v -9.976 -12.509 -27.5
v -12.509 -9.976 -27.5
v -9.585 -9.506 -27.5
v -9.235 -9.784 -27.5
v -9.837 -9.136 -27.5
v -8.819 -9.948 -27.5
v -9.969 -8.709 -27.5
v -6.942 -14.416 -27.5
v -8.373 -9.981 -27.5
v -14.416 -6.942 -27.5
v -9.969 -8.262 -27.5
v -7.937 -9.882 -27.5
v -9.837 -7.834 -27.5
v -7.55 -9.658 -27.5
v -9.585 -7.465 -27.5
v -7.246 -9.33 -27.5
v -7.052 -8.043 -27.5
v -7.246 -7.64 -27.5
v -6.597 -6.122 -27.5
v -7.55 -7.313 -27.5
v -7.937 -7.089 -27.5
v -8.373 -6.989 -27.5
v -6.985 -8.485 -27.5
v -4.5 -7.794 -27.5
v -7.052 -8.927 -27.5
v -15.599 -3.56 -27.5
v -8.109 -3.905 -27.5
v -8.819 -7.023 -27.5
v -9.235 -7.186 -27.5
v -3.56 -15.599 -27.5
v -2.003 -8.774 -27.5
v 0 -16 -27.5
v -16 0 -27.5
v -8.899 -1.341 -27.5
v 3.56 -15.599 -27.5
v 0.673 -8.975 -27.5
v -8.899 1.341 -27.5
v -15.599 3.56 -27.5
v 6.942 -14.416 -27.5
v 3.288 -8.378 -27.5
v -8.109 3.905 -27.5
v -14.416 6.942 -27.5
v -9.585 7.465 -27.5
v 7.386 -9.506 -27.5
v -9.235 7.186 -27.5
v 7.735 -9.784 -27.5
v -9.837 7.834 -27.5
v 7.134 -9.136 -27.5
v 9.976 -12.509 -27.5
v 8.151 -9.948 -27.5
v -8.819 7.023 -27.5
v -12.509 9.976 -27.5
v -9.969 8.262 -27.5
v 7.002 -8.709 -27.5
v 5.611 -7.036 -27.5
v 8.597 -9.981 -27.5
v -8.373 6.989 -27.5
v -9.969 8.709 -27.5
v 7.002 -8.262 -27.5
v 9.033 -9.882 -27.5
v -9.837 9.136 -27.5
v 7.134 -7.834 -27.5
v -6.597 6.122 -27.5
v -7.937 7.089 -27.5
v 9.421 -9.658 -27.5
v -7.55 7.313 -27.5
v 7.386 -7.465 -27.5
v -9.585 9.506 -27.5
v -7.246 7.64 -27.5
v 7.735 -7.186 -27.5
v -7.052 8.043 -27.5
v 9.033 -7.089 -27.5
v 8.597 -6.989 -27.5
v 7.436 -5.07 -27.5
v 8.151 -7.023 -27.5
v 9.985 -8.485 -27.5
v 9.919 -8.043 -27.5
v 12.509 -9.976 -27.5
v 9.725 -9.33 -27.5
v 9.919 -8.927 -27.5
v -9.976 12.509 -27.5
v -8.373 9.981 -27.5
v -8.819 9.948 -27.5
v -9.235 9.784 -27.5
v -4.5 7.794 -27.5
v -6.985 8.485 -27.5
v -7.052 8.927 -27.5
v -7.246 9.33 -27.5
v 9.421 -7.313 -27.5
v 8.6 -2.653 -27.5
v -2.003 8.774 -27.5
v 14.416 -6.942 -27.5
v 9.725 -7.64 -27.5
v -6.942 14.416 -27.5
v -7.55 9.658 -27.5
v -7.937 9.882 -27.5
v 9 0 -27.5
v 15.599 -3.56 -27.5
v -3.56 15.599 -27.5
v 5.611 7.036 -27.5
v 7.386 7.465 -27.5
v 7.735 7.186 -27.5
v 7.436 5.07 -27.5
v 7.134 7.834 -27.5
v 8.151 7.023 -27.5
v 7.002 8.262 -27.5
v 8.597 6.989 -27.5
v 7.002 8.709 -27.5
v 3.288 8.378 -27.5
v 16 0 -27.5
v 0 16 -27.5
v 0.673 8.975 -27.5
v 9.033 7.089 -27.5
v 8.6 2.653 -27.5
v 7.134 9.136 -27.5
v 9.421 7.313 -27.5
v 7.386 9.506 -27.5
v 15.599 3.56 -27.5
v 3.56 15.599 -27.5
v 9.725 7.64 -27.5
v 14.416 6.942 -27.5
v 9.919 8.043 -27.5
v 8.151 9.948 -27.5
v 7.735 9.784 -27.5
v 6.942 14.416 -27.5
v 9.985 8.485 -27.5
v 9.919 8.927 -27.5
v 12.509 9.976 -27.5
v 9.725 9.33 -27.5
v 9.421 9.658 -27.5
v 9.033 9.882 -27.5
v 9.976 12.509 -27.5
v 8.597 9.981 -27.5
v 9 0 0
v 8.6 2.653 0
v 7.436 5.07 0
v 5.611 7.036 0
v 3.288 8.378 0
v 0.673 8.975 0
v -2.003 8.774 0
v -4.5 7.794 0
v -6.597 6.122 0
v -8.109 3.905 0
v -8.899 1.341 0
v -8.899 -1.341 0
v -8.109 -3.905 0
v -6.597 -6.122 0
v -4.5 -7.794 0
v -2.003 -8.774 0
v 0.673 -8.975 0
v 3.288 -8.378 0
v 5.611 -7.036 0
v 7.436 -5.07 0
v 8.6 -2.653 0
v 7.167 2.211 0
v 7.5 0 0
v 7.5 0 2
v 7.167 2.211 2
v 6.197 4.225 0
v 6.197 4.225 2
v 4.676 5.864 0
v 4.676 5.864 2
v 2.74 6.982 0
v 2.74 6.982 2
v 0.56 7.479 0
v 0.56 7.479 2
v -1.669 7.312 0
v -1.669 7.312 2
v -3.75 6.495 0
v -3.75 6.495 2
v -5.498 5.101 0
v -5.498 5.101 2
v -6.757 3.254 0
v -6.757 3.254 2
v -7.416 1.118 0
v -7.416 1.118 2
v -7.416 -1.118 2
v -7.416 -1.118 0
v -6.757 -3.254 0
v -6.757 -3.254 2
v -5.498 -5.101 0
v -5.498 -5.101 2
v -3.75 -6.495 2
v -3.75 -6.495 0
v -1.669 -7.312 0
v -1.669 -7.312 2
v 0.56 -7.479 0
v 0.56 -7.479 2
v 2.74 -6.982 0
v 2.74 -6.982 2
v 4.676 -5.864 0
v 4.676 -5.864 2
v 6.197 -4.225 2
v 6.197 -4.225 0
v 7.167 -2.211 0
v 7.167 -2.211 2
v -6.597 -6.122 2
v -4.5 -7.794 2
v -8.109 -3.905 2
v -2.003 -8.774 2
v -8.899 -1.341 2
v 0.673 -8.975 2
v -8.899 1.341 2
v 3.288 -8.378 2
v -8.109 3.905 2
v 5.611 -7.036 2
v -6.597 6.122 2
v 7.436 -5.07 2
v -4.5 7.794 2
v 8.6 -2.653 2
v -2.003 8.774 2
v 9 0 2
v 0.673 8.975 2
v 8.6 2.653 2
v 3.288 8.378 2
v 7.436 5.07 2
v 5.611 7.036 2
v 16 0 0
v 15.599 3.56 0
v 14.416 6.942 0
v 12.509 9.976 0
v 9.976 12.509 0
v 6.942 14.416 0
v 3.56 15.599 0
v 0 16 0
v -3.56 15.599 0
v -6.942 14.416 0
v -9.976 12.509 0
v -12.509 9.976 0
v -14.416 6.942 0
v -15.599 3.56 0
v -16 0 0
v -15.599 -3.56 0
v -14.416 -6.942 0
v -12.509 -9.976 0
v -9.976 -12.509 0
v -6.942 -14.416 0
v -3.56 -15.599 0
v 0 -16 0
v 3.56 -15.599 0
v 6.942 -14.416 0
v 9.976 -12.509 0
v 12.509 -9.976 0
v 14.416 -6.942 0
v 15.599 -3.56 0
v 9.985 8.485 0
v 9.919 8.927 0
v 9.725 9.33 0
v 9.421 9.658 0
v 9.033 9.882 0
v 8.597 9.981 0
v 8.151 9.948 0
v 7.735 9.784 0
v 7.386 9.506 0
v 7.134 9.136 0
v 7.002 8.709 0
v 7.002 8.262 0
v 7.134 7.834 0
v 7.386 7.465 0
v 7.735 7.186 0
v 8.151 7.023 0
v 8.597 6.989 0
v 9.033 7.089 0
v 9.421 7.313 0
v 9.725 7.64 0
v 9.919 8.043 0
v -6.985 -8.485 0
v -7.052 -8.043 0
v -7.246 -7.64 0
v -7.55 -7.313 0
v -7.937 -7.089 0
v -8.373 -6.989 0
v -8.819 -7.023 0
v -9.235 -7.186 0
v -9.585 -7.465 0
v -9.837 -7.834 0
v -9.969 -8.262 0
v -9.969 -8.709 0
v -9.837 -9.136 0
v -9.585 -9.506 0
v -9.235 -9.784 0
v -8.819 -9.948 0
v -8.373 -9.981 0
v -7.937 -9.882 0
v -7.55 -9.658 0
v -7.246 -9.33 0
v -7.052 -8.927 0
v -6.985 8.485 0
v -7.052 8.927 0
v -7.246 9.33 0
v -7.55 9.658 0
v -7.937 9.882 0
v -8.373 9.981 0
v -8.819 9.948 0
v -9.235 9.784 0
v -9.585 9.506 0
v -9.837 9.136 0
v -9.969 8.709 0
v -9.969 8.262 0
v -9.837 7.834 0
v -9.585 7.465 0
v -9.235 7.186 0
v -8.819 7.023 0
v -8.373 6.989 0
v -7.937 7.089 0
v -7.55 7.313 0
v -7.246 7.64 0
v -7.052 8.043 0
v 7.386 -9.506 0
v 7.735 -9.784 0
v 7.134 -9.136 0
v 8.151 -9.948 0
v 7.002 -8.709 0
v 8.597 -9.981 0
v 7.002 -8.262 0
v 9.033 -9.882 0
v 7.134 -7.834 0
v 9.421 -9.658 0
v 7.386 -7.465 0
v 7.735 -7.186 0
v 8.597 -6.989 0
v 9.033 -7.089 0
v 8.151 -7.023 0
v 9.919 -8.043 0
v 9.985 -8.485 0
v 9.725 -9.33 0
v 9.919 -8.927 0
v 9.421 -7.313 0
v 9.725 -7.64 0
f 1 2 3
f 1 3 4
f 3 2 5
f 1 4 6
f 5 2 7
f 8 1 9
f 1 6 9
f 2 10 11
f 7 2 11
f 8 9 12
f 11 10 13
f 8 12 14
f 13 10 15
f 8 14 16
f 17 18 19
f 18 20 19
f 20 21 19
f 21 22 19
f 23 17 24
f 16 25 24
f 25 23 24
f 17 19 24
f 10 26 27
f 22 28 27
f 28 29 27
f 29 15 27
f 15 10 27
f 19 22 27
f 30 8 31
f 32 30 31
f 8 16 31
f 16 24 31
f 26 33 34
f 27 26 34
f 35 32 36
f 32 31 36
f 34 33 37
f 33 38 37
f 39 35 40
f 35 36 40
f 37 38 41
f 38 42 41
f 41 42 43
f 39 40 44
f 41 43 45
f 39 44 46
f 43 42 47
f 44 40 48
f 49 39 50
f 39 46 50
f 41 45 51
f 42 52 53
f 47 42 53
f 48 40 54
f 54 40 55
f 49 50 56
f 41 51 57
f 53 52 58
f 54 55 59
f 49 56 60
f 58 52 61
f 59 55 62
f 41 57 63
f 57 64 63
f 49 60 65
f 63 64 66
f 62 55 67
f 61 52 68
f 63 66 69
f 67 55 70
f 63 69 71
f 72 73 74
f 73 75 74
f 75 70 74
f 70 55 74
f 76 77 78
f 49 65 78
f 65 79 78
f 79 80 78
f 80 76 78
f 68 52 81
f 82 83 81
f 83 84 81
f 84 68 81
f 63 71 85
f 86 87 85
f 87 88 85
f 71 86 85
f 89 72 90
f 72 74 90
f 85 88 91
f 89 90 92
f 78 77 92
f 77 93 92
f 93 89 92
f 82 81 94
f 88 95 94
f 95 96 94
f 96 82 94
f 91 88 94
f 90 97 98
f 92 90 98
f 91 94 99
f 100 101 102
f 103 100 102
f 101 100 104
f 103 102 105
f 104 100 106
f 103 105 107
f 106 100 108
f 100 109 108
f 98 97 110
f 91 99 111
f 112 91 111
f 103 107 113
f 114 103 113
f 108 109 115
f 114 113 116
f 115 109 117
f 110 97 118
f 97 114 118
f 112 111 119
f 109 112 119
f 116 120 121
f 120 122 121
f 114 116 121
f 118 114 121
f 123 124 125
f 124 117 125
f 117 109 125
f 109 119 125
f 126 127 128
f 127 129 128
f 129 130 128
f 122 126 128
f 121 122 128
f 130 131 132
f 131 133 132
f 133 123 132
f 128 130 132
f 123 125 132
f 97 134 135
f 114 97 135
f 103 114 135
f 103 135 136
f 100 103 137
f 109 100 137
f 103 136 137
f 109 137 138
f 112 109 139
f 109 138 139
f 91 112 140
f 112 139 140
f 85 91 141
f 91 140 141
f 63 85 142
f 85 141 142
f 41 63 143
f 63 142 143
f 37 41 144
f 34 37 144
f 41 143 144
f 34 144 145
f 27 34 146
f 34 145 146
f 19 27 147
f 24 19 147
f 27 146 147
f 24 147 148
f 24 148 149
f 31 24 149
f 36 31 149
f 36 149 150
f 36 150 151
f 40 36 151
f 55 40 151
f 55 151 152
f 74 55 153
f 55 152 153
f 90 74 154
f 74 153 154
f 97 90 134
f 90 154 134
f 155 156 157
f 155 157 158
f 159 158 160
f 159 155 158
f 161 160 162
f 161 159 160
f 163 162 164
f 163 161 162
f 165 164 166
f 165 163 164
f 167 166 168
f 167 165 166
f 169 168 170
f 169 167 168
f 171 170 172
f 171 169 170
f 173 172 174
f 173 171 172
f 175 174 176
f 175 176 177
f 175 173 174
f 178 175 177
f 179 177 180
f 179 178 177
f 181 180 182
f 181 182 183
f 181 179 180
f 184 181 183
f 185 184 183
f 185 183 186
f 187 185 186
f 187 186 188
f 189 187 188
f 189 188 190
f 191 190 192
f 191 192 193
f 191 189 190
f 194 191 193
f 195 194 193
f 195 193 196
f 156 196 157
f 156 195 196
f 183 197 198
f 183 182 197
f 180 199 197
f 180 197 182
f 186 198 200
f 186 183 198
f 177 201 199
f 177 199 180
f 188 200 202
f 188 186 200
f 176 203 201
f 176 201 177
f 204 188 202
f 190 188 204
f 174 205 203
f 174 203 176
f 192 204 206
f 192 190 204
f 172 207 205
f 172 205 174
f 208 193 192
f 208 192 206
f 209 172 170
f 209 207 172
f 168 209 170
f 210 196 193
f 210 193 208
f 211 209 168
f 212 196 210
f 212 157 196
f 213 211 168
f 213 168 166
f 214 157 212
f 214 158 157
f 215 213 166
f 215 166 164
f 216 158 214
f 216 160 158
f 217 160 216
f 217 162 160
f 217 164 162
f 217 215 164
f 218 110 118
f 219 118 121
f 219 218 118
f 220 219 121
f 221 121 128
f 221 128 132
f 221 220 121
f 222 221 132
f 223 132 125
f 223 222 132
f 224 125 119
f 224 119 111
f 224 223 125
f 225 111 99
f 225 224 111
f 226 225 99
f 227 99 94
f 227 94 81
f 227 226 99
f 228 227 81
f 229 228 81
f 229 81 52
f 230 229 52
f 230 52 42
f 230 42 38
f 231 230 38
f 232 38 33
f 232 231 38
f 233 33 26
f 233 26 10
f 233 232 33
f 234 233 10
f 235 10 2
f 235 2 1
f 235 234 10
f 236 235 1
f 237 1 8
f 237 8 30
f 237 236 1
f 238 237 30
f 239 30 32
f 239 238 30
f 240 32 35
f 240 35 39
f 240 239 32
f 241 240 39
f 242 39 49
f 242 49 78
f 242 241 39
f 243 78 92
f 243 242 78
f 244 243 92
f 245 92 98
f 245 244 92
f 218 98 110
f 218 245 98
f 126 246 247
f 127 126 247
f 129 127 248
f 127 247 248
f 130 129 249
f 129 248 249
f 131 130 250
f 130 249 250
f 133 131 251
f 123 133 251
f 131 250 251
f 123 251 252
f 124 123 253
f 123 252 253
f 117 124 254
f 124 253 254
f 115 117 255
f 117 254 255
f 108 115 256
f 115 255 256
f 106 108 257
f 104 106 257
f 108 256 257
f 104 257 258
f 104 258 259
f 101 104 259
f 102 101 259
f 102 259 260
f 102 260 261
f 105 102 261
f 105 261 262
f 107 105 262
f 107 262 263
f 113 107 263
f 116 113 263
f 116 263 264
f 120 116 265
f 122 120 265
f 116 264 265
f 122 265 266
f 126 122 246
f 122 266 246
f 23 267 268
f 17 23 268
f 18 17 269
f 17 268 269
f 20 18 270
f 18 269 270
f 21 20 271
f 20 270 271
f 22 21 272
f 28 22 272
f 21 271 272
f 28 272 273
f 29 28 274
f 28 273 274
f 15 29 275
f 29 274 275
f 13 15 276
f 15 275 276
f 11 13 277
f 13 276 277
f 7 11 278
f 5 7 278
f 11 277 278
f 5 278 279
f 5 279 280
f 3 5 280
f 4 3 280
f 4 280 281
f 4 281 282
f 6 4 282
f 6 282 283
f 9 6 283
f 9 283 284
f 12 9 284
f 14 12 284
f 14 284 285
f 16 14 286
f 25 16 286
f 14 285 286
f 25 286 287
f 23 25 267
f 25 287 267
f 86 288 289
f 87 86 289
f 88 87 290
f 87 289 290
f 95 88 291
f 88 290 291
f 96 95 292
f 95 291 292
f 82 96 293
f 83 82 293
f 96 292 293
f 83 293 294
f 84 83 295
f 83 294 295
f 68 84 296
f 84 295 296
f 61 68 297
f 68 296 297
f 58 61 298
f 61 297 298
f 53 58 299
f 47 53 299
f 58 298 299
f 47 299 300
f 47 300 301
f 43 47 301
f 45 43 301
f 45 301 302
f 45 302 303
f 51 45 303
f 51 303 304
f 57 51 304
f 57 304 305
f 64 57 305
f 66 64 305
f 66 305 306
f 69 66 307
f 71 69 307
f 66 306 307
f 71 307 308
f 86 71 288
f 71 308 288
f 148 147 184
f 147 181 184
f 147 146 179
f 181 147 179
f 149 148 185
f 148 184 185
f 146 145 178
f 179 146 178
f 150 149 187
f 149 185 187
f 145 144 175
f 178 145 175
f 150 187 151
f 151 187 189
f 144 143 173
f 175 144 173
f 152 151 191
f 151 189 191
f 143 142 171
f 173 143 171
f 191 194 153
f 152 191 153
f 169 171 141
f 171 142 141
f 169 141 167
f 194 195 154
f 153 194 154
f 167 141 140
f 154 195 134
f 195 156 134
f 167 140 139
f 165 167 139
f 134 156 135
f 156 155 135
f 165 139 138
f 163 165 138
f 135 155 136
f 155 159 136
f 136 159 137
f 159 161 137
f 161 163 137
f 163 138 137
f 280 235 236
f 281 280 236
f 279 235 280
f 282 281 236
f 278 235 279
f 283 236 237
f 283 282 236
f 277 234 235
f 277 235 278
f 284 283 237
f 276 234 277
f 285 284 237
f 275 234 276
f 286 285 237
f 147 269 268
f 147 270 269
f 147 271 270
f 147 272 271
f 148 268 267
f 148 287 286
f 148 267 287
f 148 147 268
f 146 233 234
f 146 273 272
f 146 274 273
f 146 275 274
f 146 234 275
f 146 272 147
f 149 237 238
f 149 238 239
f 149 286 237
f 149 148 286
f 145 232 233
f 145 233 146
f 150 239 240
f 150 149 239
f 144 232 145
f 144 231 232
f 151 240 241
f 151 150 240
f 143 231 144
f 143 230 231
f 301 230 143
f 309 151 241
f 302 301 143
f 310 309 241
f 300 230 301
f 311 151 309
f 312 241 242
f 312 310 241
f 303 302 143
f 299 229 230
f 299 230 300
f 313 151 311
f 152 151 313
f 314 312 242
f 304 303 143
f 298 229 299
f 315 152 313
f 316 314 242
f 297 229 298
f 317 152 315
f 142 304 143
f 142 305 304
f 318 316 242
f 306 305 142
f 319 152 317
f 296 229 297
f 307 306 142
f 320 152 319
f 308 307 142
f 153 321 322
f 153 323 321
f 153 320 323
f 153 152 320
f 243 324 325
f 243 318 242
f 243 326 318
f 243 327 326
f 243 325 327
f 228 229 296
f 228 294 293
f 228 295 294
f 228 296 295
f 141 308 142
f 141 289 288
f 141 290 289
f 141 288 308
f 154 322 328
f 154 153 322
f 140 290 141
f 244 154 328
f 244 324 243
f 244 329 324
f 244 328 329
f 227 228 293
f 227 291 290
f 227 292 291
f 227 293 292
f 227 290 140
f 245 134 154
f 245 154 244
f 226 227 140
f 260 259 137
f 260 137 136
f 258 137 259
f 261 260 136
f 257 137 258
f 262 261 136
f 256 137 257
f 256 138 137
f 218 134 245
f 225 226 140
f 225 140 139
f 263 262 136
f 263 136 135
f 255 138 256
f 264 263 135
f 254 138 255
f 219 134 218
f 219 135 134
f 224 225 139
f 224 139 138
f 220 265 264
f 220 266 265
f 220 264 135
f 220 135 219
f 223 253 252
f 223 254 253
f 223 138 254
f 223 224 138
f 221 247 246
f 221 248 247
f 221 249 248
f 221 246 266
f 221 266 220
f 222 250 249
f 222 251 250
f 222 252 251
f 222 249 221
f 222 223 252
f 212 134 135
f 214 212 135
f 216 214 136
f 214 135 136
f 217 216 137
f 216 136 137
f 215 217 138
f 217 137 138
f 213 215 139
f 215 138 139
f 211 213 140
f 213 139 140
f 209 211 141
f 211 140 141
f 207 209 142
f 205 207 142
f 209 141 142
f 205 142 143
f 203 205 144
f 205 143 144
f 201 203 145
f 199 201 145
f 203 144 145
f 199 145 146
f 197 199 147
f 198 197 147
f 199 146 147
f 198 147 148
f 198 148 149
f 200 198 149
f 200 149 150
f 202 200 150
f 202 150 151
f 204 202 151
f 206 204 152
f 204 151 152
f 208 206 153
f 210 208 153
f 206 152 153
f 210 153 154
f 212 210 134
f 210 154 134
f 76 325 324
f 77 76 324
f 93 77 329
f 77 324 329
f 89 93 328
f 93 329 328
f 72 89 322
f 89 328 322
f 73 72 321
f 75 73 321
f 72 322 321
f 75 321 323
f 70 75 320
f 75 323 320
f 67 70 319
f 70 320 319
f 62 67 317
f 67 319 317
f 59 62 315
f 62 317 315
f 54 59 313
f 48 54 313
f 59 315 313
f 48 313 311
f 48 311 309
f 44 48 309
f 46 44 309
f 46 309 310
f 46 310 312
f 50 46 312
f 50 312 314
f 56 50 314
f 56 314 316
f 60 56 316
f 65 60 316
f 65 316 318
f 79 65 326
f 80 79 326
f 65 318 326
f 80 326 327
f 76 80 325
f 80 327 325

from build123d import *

# Parameters (mm, degrees)
SKETCH1_R           = 16
SKETCH1_R_2         = 1.5
SKETCH1_R_3         = 9
BOSS_EXTRUDE1_DEPTH = 27.5
SKETCH1_3_R         = 9
SKETCH1_3_R_2       = 7.5
BOSS_EXTRUDE2_DEPTH = 2


with BuildPart() as part:
    # Sketch1 → Boss-Extrude1 (new body)
    with BuildSketch(Plane.XY):
        Circle(SKETCH1_R)
        with Locations((-8.485281374, -8.485281374)):
            Circle(SKETCH1_R_2, mode=Mode.SUBTRACT)
        with Locations((8.485281374, -8.485281374)):
            Circle(SKETCH1_R_2, mode=Mode.SUBTRACT)
        with Locations((8.485281374, 8.485281374)):
            Circle(SKETCH1_R_2, mode=Mode.SUBTRACT)
        with Locations((-8.485281374, 8.485281374)):
            Circle(SKETCH1_R_2, mode=Mode.SUBTRACT)
        Circle(SKETCH1_R_3, mode=Mode.SUBTRACT)
    extrude(amount=-BOSS_EXTRUDE1_DEPTH)


with BuildPart() as body_2:
    # Sketch1<3> → Boss-Extrude2 (new body)
    with BuildSketch(Plane.XY):
        Circle(SKETCH1_3_R)
        Circle(SKETCH1_3_R_2, mode=Mode.SUBTRACT)
    extrude(amount=BOSS_EXTRUDE2_DEPTH)


solid = Compound([part.part, body_2.part])
